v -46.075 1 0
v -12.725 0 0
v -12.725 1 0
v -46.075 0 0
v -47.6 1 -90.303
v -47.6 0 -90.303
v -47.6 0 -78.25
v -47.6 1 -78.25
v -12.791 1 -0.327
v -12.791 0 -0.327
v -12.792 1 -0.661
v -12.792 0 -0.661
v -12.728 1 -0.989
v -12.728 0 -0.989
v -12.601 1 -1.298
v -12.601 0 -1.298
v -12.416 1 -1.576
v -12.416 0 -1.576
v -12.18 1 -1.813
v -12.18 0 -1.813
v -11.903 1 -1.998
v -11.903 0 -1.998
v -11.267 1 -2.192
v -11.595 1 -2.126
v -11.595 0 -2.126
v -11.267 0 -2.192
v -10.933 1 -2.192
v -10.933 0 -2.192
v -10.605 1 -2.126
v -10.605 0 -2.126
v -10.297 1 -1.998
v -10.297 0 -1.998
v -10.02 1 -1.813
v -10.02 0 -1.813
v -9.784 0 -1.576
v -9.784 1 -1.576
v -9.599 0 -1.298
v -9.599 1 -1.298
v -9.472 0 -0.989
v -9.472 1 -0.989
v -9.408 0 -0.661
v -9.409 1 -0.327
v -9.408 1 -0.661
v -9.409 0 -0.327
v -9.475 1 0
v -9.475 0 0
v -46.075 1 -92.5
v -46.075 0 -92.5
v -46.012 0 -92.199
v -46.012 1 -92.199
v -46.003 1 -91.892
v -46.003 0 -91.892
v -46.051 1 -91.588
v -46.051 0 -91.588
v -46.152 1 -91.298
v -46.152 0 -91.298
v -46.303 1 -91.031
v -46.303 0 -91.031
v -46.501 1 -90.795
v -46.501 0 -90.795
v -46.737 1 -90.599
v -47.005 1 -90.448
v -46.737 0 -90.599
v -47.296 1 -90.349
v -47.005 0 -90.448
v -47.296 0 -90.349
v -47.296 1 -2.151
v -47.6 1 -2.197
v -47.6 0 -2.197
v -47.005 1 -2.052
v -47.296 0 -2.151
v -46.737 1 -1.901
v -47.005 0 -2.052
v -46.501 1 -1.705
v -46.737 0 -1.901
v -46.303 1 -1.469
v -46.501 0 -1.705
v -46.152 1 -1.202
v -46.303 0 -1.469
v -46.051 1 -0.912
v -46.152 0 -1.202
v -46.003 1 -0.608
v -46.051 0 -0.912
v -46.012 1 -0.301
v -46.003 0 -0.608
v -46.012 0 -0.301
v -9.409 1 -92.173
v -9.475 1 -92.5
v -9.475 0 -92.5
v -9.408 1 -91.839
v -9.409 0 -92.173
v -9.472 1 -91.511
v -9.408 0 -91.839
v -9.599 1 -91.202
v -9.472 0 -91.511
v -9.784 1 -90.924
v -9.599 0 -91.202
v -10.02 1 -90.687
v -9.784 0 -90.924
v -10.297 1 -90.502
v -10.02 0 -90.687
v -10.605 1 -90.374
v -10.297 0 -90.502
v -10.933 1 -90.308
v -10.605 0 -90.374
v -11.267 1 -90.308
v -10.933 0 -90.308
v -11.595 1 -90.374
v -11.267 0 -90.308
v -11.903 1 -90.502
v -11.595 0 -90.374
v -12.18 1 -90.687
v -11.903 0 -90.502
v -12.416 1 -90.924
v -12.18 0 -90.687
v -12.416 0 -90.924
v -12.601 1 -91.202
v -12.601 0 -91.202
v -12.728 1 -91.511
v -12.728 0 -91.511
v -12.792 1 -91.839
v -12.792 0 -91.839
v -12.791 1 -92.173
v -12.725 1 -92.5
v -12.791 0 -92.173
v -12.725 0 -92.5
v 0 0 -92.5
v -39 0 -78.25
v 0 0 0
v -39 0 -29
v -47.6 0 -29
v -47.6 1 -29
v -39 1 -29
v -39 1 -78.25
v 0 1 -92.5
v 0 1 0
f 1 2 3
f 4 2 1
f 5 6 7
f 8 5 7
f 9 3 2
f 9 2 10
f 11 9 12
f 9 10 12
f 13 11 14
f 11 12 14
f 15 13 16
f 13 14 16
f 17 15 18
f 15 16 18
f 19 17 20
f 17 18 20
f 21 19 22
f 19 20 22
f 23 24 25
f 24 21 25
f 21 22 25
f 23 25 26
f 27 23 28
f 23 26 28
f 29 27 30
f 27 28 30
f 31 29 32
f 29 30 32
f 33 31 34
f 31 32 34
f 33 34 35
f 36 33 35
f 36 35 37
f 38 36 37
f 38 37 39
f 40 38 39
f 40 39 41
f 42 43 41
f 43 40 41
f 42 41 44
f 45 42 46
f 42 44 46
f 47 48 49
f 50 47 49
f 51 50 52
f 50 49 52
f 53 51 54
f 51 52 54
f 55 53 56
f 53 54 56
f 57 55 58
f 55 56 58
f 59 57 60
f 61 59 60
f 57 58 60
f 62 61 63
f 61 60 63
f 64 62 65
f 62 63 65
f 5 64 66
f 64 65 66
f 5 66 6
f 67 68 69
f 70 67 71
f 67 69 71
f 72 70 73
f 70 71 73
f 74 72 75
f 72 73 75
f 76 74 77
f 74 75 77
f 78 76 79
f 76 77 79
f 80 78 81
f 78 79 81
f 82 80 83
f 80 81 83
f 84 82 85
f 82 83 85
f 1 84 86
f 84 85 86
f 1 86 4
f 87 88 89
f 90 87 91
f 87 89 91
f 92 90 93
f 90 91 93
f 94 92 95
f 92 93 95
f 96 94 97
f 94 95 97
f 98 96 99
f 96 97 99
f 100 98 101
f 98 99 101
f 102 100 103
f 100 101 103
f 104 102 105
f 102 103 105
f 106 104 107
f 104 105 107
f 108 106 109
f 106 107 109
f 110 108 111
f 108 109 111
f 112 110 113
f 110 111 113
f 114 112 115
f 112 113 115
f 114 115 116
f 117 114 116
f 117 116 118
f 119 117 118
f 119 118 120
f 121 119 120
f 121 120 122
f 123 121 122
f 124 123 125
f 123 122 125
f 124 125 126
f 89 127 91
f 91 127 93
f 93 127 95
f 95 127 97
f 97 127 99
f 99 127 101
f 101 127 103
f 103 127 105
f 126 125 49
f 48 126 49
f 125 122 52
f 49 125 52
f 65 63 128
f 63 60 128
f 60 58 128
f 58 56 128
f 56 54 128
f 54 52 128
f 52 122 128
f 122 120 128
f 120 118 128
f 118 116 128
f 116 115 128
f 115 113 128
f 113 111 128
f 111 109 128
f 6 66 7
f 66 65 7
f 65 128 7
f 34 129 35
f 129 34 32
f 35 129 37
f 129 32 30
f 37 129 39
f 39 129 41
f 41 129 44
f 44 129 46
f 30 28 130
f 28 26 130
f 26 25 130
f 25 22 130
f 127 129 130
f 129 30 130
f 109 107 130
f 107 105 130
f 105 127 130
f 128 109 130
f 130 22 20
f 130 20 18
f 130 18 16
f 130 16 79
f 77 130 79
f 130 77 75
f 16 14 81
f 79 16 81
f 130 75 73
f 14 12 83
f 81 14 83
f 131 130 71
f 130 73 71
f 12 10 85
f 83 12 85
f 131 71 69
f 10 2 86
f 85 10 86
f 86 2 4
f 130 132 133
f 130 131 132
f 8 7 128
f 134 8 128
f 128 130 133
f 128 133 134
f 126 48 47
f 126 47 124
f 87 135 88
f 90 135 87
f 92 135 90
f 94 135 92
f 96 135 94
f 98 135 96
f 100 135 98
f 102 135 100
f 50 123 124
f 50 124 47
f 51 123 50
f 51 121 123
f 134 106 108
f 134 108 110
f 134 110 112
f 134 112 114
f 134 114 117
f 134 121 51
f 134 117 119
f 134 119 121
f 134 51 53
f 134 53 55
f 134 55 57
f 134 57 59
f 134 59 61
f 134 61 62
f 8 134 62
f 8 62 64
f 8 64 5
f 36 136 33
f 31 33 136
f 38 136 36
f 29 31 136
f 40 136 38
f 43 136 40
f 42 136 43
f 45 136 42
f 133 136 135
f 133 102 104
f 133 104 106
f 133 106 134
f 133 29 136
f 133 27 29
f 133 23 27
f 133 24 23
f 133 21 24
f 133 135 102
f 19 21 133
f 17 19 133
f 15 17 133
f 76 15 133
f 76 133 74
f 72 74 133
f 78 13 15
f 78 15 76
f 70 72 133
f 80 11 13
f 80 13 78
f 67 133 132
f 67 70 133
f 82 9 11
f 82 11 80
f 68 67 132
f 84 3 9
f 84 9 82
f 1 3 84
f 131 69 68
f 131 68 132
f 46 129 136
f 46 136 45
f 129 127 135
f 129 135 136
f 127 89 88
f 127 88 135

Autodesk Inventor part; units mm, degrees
ref_plane "YZ Plane" through (0, 0, 0) normal (1, 0, 0) x (0, 1, 0)
ref_plane "XZ Plane" through (0, 0, 0) normal (0, 1, 0) x (-1, 0, 0)
ref_plane "XY Plane" through (0, 0, 0) normal (0, 0, 1) x (1, 0, 0)
sketch "Szkic1" plane through (0, 0, 0) normal (0, 1, 0) x (-1, 0, 0)
  line L0 (0, 0) -> (39, 0)
  line L1 (39, 0) -> (39, -92.5)
  line L2 (39, -92.5) -> (0, -92.5)
  line L3 (0, -92.5) -> (0, 0)
  line L4 (39, 0) -> (47.6, 0)
  line L5 (47.6, 0) -> (47.6, -29)
  line L6 (47.6, -29) -> (39, -29)
  line L7 (39, -29) -> (39, 0)
  line L8 (0, -46.25) -> (39, -46.25) construction
  line L9 (0, 0) -> (7.8, 0) construction
  line L10 (7.8, 0) -> (7.8, -5) construction
  line L11 (7.8, -5) -> (0, -5) construction
  line L12 (0, -5) -> (0, 0) construction
  line L13 (0, -92.5) -> (7.8, -92.5) construction
  line L14 (7.8, -92.5) -> (7.8, -87.5) construction
  line L15 (7.8, -87.5) -> (0, -87.5) construction
  line L16 (0, -87.5) -> (0, -92.5) construction
  line L17 (39, -92.5) -> (47.6, -92.5)
  line L18 (47.6, -92.5) -> (47.6, -78.25)
  line L19 (47.6, -78.25) -> (39, -78.25)
  line L20 (39, -78.25) -> (39, -92.5)
  line L21 (39, -92.5) -> (18, -92.5) construction
  line L22 (18, -92.5) -> (18, -29.5) construction
  line L23 (18, -29.5) -> (39, -29.5) construction
  line L24 (39, -29.5) -> (39, -92.5) construction
  circle A0 centre (47.7, -0.5) radius 1.7
  circle A1 centre (11.1, -0.5) radius 1.7
  circle A2 centre (47.7, -92) radius 1.7
  circle A3 centre (11.1, -92) radius 1.7
  point P0 (13.8, -33.8)
  point P1 (13.8, -58.7)
  dimension "d0" = 39
  dimension "d1" = 92.5
  dimension "d2" = 8.6
  dimension "d3" = 29
  dimension "d4" = 33.8
  dimension "d5" = 33.8
  dimension "d6" = 5
  dimension "d7" = 7.8
  dimension "d9" = 14.25
  dimension "d10" = 63
  dimension "d11" = 21
  dimension "d12" = 0.1
  dimension "d13" = 3.4
  dimension "d14" = 0.5
  dimension "d15" = 36.6
extrude "Plytka" add sketch "Szkic1" along normal blind 1 contours L0 A1 L1 L2 A3 L3 | L0 A1 | A3 L2 | L4 A0 L5 L6 L1 | L4 L5 A0 | L1 L19 L18 A2 L17 | A2 L18 L17 picked at (10.5661, -0.3857) picked at (10.6392, -91.3315) picked at (47.4739, -1.4428) picked at (47.4739, -91.0572)
extrude "Otwory" cut sketch "Szkic1" along normal up to surface (1 mm away) contours A1 L0 | L0 A1 | A3 L2 | L2 A3 | A0 L5 L4 | L4 L5 A0 | A2 L18 L17 | L17 L18 A2
sketch "Marginesy(Nie dotycza spodu plytki w strefie czujnika lini)" plane through (0, 1, 0) normal (0, 1, 0) x (1, 0, 0)
  line L0 (-47.6, 0) -> (-39, 0)
  line L1 (-39, 0) -> (-39, 2.4)
  line L2 (-39, 2.4) -> (-47.6, 2.4)
  line L3 (-47.6, 2.4) -> (-47.6, 0)
  line L4 (-46.0752, 0) -> (-12.7248, 0) projected
  line L5 (-47.6, 29) -> (-47.6, 2.1971) projected
  line L6 (-39, 78.25) -> (-39, 29) projected
  line L7 (-39, 0) -> (-16.9, 0)
  line L8 (-16.9, 0) -> (-16.9, 0.4)
  line L9 (-16.9, 0.4) -> (-39, 0.4)
  line L10 (-39, 0.4) -> (-39, 0)
  line L11 (0, 0) -> (0, 92.5) projected
  line L12 (-16.9, 0) -> (0, 0)
  line L13 (0, 0) -> (0, 2.4)
  line L14 (0, 2.4) -> (-16.9, 2.4)
  line L15 (-16.9, 2.4) -> (-16.9, 0)
  line L16 (0, 46.25) -> (-39, 46.25) construction
  line L17 (-47.6, 92.5) -> (-39, 92.5)
  line L18 (-39, 92.5) -> (-39, 90.1)
  line L19 (-39, 90.1) -> (-47.6, 90.1)
  line L20 (-47.6, 90.1) -> (-47.6, 92.5)
  line L21 (-46.0752, 92.5) -> (-12.7248, 92.5)
  line L22 (-39, 92.5) -> (-16.9, 92.5)
  line L23 (-16.9, 92.5) -> (-16.9, 92.1)
  line L24 (-16.9, 92.1) -> (-39, 92.1)
  line L25 (-39, 92.1) -> (-39, 92.5)
  line L26 (-16.9, 92.5) -> (0, 92.5)
  line L27 (0, 92.5) -> (0, 90.1)
  line L28 (0, 90.1) -> (-16.9, 90.1)
  line L29 (-16.9, 90.1) -> (-16.9, 92.5)
  arc A0 (-47.6, 90.3029) -> (-46.0752, 92.5) centre (-47.7, 92) ccw construction
  circle A1 centre (-47.7, 92) radius 2.85 construction
  arc A2 (-12.7248, 92.5) -> (-9.4752, 92.5) centre (-11.1, 92) ccw construction
  circle A3 centre (-11.1, 92) radius 2.85 construction
  arc A4 (-46.0752, 0) -> (-47.6, 2.1971) centre (-47.7, 0.5) ccw construction
  arc A5 (-9.4752, 0) -> (-12.7248, 0) centre (-11.1, 0.5) ccw construction
  circle A6 centre (-47.7, 0.5) radius 2.85 construction
  circle A7 centre (-11.1, 0.5) radius 2.85 construction
  point P0 (0, 92.5)
  dimension "d20" = 2.4
  dimension "d21" = 0.4
  dimension "d22" = 22.1
  dimension "d24" = 5.7
properties part number "PlytkaWymiary"
